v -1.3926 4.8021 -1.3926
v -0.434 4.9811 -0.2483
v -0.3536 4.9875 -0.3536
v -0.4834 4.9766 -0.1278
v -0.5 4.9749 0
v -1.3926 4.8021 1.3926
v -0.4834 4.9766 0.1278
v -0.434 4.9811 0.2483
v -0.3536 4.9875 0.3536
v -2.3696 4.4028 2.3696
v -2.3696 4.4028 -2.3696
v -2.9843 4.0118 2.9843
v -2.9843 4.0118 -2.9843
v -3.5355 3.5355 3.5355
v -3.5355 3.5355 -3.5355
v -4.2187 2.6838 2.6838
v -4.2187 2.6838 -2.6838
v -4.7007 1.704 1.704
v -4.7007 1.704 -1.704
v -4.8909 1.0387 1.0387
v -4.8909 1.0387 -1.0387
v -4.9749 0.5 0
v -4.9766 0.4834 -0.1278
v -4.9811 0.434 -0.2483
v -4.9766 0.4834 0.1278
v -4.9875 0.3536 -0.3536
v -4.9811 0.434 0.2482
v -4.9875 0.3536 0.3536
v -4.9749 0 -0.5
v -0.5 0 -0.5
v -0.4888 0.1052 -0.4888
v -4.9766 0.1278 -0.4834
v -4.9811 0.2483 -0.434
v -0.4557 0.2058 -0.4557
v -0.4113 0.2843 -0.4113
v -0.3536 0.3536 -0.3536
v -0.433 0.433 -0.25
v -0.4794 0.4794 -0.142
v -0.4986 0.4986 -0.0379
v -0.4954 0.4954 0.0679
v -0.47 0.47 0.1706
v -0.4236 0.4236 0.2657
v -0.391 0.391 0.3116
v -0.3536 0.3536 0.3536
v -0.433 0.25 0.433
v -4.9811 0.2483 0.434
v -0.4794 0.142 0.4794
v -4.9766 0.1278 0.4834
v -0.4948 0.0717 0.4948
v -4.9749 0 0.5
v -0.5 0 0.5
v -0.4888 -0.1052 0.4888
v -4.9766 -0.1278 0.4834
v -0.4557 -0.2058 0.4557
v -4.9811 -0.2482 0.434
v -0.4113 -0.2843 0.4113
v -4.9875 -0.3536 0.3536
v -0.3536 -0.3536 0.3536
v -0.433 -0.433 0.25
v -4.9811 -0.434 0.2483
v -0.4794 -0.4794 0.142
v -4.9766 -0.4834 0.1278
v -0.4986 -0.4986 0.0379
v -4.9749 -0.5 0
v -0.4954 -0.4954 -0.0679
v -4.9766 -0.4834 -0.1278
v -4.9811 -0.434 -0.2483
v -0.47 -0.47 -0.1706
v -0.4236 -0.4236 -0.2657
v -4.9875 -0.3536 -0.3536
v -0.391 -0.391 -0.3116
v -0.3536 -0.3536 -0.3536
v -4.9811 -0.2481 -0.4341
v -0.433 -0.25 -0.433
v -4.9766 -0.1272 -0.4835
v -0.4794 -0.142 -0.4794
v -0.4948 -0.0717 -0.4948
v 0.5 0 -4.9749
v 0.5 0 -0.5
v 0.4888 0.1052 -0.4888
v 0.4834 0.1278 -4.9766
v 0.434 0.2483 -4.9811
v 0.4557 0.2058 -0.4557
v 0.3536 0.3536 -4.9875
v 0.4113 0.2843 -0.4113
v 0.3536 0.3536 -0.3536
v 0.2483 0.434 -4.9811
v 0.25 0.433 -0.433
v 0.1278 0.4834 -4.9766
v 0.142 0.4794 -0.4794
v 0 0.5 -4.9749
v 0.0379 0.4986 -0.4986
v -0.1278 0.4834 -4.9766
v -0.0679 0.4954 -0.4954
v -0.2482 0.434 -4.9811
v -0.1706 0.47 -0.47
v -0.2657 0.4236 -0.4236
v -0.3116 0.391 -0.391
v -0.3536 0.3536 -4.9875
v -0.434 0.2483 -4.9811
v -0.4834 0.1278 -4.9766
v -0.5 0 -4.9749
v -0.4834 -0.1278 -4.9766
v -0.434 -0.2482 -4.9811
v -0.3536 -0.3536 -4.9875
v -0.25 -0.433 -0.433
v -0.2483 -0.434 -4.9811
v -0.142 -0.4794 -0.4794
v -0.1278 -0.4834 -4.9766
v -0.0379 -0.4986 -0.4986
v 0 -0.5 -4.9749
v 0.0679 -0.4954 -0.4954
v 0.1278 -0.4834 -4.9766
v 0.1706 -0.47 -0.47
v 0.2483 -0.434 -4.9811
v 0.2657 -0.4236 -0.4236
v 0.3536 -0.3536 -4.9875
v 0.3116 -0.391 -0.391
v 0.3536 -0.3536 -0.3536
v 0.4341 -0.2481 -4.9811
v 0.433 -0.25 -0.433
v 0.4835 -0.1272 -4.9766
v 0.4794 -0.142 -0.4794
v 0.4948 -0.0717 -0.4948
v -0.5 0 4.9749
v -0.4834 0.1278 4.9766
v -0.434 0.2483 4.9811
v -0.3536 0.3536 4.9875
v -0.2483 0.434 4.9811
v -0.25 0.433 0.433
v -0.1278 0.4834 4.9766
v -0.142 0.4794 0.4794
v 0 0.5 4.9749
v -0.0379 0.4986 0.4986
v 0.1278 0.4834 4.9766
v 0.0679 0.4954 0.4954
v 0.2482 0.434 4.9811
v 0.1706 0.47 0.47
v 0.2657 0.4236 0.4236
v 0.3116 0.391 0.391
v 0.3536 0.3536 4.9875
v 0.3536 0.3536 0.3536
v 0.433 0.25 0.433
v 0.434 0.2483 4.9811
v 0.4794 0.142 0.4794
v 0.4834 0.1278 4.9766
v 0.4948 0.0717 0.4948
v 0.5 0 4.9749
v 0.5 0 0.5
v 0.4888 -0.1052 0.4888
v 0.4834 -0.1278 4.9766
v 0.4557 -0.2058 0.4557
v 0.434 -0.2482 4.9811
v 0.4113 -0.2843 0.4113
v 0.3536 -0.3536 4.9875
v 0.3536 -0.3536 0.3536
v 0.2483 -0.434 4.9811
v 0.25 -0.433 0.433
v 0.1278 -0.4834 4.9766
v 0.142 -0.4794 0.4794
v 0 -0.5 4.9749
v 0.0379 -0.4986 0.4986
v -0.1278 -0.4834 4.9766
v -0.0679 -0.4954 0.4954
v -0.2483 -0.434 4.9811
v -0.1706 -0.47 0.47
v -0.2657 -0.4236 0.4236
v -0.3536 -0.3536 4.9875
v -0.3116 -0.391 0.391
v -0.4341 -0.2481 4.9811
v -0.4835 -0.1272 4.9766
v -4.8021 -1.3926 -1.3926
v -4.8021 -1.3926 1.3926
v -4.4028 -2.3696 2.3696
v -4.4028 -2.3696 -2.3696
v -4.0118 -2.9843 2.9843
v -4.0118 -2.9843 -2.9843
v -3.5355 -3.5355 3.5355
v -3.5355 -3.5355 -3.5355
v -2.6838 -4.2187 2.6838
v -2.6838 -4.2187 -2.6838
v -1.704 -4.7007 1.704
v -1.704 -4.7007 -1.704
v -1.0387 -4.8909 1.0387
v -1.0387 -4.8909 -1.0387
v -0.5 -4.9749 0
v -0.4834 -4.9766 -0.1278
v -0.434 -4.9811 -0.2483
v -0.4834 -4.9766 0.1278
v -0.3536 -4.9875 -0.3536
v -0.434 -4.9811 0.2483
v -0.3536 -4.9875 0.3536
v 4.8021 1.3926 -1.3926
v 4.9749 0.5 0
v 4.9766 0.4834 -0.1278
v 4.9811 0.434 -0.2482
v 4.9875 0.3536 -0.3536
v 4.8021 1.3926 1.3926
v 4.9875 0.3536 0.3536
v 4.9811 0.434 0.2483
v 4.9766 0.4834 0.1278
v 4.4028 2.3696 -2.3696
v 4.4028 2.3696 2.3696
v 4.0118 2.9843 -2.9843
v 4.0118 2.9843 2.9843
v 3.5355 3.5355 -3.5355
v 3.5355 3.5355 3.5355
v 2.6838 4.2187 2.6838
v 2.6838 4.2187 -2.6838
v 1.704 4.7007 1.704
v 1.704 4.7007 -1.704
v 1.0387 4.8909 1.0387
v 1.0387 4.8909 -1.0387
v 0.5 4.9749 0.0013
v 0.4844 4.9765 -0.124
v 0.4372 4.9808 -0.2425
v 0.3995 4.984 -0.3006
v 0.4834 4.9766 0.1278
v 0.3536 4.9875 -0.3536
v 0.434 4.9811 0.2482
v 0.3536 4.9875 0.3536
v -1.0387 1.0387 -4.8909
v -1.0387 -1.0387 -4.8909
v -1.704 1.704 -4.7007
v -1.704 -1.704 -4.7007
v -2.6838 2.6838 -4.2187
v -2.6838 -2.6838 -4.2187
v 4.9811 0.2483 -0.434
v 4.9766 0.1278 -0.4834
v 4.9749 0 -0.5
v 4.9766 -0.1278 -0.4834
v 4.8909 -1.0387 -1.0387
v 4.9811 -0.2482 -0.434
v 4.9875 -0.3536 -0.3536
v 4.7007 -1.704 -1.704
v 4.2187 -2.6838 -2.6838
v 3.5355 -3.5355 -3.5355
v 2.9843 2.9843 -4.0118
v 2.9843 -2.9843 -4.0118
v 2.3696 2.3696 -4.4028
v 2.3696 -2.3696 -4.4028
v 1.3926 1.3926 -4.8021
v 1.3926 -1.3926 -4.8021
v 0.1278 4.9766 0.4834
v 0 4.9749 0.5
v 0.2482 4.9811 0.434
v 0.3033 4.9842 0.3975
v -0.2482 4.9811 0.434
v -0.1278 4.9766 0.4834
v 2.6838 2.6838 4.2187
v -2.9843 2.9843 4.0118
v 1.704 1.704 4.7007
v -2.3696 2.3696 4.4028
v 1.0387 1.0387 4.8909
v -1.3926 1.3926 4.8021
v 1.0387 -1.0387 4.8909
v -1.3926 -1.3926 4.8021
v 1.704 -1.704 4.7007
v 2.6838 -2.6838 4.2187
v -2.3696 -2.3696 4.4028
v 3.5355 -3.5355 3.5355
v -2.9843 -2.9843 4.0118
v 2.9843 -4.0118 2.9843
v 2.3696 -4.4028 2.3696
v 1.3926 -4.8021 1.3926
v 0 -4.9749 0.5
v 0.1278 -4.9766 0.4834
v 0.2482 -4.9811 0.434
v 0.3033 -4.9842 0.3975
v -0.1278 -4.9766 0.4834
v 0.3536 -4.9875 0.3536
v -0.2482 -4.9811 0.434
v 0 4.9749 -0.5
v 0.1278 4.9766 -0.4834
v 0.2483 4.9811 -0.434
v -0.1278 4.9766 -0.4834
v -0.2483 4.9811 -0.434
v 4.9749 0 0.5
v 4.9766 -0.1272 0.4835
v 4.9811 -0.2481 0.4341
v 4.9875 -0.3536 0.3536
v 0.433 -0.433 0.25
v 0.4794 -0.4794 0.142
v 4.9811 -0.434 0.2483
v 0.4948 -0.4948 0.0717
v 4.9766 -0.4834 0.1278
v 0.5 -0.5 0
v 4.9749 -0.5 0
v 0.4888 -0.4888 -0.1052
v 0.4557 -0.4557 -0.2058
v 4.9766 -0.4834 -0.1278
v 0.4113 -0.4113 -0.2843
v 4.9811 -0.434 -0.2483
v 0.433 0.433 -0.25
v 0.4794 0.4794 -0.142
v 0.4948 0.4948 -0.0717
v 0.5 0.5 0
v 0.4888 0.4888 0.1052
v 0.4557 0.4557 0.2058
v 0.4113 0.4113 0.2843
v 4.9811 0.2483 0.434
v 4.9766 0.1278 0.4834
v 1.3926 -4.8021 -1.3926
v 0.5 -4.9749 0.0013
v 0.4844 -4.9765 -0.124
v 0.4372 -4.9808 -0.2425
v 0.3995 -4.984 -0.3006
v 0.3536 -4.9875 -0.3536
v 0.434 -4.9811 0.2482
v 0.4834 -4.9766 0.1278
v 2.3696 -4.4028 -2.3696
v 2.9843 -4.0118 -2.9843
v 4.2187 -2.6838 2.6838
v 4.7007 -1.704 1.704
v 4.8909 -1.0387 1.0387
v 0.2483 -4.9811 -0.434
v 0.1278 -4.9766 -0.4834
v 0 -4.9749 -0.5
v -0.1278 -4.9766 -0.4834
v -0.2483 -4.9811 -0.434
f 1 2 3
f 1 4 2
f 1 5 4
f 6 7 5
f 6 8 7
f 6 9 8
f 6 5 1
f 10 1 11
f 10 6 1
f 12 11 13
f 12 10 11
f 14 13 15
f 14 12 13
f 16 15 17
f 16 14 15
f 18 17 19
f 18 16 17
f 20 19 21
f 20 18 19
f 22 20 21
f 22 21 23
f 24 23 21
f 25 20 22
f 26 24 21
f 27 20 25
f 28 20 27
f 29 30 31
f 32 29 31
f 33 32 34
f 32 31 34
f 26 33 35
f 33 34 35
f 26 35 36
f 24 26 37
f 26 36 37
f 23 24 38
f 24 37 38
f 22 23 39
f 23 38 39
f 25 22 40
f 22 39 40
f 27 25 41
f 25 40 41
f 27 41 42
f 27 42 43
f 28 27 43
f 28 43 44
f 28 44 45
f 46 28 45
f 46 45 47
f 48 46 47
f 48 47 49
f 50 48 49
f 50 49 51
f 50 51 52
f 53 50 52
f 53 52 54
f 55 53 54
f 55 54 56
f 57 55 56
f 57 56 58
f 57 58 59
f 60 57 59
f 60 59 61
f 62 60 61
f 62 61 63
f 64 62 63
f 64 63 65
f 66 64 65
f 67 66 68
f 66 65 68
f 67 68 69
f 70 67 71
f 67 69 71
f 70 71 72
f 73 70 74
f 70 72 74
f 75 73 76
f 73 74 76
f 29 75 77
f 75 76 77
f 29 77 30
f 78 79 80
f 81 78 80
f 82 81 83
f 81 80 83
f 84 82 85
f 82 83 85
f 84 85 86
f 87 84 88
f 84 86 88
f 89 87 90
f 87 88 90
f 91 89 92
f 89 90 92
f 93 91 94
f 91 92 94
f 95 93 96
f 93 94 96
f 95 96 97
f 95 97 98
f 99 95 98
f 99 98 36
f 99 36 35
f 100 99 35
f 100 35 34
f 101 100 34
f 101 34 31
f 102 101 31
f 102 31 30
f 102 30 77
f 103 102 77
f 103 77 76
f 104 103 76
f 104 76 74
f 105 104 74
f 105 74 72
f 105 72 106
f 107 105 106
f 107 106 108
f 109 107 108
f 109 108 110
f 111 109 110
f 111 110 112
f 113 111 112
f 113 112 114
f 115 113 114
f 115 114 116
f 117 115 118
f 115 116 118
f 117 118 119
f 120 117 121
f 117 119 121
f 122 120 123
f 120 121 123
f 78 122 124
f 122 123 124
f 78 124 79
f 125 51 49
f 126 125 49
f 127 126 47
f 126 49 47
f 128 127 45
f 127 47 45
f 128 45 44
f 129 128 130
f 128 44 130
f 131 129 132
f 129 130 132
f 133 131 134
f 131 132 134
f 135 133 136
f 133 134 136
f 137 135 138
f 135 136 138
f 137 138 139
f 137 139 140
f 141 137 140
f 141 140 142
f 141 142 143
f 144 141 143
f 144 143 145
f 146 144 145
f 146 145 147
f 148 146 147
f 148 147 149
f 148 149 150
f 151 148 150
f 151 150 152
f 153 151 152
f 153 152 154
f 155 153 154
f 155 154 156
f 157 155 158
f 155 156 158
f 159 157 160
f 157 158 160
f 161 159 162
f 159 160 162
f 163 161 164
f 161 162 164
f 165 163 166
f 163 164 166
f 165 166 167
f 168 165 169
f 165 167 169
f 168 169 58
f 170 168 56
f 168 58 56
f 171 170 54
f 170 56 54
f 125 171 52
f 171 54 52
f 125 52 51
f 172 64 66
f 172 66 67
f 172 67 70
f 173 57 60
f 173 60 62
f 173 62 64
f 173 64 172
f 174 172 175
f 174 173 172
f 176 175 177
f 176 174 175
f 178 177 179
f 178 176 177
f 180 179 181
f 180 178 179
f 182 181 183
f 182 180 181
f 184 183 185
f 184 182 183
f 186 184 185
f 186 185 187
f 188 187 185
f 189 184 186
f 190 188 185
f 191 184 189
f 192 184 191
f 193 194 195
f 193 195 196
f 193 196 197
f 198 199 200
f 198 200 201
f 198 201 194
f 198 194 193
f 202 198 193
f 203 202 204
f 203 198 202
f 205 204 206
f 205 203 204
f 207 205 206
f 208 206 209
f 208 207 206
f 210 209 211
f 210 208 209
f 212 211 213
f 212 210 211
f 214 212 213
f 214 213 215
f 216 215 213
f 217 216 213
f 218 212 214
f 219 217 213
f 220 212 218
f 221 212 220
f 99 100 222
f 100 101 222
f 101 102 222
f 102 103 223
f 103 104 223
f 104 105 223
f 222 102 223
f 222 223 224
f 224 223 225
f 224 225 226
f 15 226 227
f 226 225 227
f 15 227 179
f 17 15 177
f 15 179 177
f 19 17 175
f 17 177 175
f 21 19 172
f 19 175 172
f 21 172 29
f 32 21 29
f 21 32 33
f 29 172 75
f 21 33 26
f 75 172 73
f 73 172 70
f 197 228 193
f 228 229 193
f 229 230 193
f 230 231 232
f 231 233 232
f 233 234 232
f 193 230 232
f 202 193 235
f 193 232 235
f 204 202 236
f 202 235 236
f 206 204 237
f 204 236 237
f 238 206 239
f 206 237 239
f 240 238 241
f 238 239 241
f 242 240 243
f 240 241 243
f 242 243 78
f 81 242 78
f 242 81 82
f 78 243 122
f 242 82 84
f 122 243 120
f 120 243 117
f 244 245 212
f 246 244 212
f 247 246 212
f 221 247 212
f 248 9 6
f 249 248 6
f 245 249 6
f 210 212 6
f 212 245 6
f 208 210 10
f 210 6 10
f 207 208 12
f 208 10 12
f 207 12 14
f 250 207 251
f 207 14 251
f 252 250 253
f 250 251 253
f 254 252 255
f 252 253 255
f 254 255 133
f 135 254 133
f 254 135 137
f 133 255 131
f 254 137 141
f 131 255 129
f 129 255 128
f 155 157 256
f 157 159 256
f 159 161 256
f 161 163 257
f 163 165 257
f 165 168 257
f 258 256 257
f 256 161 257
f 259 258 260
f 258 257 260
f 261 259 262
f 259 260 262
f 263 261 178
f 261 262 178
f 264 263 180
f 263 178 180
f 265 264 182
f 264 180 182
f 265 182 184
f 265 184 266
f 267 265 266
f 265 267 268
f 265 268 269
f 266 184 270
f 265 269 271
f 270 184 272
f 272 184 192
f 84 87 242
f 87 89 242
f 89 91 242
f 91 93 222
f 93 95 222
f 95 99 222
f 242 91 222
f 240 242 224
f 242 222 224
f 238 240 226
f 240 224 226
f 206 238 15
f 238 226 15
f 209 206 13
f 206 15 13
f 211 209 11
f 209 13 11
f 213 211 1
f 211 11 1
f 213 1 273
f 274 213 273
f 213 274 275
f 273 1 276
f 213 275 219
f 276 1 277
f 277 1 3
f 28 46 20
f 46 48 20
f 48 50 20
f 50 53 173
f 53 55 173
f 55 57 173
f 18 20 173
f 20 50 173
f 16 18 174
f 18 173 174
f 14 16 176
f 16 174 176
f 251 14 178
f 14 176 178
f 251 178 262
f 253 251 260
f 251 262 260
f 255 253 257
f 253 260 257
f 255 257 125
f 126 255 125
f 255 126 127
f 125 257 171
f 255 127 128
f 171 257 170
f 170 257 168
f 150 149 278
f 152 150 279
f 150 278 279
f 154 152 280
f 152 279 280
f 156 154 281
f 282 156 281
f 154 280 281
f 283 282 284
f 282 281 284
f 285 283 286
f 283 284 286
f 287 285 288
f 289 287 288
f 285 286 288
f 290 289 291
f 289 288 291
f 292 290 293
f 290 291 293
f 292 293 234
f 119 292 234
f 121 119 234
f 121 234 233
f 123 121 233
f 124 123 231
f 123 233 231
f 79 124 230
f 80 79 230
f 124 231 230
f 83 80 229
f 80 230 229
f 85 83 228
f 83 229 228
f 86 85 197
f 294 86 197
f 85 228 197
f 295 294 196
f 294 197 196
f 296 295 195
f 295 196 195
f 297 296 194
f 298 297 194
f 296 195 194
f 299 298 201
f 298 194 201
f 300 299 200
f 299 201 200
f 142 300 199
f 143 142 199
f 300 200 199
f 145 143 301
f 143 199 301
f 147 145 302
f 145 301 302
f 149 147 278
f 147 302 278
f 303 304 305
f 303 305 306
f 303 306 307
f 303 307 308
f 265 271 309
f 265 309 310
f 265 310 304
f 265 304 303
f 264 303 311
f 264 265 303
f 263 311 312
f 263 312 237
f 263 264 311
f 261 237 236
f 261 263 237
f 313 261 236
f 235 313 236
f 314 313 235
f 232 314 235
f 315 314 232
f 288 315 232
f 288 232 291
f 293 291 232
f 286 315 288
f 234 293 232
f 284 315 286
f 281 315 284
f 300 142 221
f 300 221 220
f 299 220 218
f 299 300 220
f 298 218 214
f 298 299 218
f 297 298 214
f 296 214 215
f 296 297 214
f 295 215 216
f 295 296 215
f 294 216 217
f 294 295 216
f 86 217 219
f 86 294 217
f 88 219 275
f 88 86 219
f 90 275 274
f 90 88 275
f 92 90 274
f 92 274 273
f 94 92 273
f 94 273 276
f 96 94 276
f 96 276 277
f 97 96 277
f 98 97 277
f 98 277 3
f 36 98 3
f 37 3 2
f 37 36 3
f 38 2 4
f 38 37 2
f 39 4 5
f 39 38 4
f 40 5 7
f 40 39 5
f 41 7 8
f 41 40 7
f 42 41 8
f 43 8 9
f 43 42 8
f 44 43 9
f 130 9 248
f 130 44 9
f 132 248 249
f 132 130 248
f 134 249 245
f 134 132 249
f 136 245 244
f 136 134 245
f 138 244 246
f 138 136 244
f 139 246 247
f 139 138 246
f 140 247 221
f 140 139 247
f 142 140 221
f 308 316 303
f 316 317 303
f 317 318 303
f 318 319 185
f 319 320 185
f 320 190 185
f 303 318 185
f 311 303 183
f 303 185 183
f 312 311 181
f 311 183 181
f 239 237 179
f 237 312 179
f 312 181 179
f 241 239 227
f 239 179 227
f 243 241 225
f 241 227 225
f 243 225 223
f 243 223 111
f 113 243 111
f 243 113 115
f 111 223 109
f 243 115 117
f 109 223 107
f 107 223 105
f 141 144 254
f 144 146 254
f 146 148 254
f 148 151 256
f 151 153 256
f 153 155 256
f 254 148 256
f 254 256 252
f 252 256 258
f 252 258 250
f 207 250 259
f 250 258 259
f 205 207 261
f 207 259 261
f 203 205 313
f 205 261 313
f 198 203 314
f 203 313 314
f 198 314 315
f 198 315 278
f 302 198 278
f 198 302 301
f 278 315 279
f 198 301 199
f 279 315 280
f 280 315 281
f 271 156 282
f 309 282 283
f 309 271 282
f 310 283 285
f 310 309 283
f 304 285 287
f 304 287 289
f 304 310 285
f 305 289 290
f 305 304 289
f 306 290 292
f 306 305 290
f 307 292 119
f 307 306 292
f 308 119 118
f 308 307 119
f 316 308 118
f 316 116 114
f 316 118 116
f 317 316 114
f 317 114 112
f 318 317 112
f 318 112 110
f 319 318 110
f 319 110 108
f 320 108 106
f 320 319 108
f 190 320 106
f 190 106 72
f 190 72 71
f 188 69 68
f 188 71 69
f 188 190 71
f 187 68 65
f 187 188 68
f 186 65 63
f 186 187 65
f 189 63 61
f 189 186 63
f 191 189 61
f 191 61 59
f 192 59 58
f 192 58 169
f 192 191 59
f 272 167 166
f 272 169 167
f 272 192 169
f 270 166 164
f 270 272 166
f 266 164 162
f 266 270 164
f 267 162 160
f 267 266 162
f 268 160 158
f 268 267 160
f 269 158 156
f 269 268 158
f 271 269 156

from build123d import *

# Parameters (mm, degrees)
SKETCH_2_W               = 20
SKETCH_2_H               = 20
EXTRUDE_1_DEPTH          = 10
SKETCH_3_OUTSIDE_W       = 28.928
SKETCH_3_OUTSIDE_H       = 28.928
SKETCH_3_OUTSIDE_R       = 5
CUT_EXTRUDE_1_DEPTH      = 20
SKETCH_4_OUTSIDE_W       = 16.898
SKETCH_4_OUTSIDE_H       = 26.898
SKETCH_4_OUTSIDE_R       = 5
CUT_EXTRUDE_2_DEPTH      = 10
SKETCH_5_OUTSIDE_W       = 15.464
SKETCH_5_OUTSIDE_H       = 15.464
SKETCH_5_OUTSIDE_R       = 5
CUT_EXTRUDE_3_DEPTH      = 10
CUT_EXTRUDE_4_REACH      = 10.66
SKETCH_6_R               = 0.5
PATTERN_CIRCULAR_1_COUNT = 4
CUT_EXTRUDE_5_DEPTH      = 9.645808409
CUT_EXTRUDE_5_DEPTH_BACK = 9.645808409
SKETCH_7_R               = 0.5


with BuildPart() as part:
    # 草图2 → 凸台-拉伸1 (new, symmetric)
    with BuildSketch(Plane(origin=(0, 0, 0), x_dir=(1, 0, 0), z_dir=(0, 1, 0))):
        Rectangle(SKETCH_2_W, SKETCH_2_H)
    extrude(amount=EXTRUDE_1_DEPTH, both=True)

    # 草图3 outside → 切除-拉伸1 (cut)
    with BuildSketch(Plane.XY.offset(10)):
        Rectangle(SKETCH_3_OUTSIDE_W, SKETCH_3_OUTSIDE_H)
        Circle(SKETCH_3_OUTSIDE_R, mode=Mode.SUBTRACT)
    extrude(amount=-CUT_EXTRUDE_1_DEPTH, mode=Mode.SUBTRACT)

    # 草图4 outside → 切除-拉伸2 (cut, symmetric)
    with BuildSketch(Plane(origin=(0, 0, 0), x_dir=(1, 0, 0), z_dir=(0, 1, 0))):
        Rectangle(SKETCH_4_OUTSIDE_W, SKETCH_4_OUTSIDE_H)
        Circle(SKETCH_4_OUTSIDE_R, mode=Mode.SUBTRACT)
    extrude(amount=CUT_EXTRUDE_2_DEPTH, both=True, mode=Mode.SUBTRACT)

    # 草图5 outside → 切除-拉伸3 (cut, symmetric)
    with BuildSketch(Plane(origin=(0, 0, 0), x_dir=(0, 0, -1), z_dir=(1, 0, 0))):
        Rectangle(SKETCH_5_OUTSIDE_W, SKETCH_5_OUTSIDE_H)
        Circle(SKETCH_5_OUTSIDE_R, mode=Mode.SUBTRACT)
    extrude(amount=CUT_EXTRUDE_3_DEPTH, both=True, mode=Mode.SUBTRACT)

    # 草图6 → 切除-拉伸4 (cut, up to next)
    with BuildSketch(Plane(origin=(0, 0, 0), x_dir=(0, 0, -1), z_dir=(1, 0, 0)), mode=Mode.PRIVATE) as cut_extrude_4_sk1:
        Circle(SKETCH_6_R)
    cut_extrude_4_tool1 = extrude(cut_extrude_4_sk1.sketch, amount=-CUT_EXTRUDE_4_REACH, mode=Mode.PRIVATE) & part.part
    cut_extrude_4 = cut_extrude_4_tool1.solids().sort_by_distance((0, 0, 0))[0]
    add(cut_extrude_4, mode=Mode.SUBTRACT)

    # 阵列(圆周)1: 切除-拉伸4 ×4 about axis
    pattern_circular_1_axis = Axis((0, 5.5, 0), (0, -1, 0))
    for i in range(1, PATTERN_CIRCULAR_1_COUNT):
        add(cut_extrude_4.rotate(pattern_circular_1_axis, i * 360 / PATTERN_CIRCULAR_1_COUNT), mode=Mode.SUBTRACT)

    # 草图7 → 切除-拉伸5 (cut, two sides: drawn at the far end of the back side and taken through both)
    with BuildSketch(Plane(origin=(0, 0, 0), x_dir=(1, 0, 0), z_dir=(0, 1, 0)).offset(-CUT_EXTRUDE_5_DEPTH_BACK)):
        with Locations(Location((0, 0, 0), (0, 0, 314.999999812))):
            Circle(SKETCH_7_R)
    extrude(amount=CUT_EXTRUDE_5_DEPTH + CUT_EXTRUDE_5_DEPTH_BACK, mode=Mode.SUBTRACT)


solid = part.part
